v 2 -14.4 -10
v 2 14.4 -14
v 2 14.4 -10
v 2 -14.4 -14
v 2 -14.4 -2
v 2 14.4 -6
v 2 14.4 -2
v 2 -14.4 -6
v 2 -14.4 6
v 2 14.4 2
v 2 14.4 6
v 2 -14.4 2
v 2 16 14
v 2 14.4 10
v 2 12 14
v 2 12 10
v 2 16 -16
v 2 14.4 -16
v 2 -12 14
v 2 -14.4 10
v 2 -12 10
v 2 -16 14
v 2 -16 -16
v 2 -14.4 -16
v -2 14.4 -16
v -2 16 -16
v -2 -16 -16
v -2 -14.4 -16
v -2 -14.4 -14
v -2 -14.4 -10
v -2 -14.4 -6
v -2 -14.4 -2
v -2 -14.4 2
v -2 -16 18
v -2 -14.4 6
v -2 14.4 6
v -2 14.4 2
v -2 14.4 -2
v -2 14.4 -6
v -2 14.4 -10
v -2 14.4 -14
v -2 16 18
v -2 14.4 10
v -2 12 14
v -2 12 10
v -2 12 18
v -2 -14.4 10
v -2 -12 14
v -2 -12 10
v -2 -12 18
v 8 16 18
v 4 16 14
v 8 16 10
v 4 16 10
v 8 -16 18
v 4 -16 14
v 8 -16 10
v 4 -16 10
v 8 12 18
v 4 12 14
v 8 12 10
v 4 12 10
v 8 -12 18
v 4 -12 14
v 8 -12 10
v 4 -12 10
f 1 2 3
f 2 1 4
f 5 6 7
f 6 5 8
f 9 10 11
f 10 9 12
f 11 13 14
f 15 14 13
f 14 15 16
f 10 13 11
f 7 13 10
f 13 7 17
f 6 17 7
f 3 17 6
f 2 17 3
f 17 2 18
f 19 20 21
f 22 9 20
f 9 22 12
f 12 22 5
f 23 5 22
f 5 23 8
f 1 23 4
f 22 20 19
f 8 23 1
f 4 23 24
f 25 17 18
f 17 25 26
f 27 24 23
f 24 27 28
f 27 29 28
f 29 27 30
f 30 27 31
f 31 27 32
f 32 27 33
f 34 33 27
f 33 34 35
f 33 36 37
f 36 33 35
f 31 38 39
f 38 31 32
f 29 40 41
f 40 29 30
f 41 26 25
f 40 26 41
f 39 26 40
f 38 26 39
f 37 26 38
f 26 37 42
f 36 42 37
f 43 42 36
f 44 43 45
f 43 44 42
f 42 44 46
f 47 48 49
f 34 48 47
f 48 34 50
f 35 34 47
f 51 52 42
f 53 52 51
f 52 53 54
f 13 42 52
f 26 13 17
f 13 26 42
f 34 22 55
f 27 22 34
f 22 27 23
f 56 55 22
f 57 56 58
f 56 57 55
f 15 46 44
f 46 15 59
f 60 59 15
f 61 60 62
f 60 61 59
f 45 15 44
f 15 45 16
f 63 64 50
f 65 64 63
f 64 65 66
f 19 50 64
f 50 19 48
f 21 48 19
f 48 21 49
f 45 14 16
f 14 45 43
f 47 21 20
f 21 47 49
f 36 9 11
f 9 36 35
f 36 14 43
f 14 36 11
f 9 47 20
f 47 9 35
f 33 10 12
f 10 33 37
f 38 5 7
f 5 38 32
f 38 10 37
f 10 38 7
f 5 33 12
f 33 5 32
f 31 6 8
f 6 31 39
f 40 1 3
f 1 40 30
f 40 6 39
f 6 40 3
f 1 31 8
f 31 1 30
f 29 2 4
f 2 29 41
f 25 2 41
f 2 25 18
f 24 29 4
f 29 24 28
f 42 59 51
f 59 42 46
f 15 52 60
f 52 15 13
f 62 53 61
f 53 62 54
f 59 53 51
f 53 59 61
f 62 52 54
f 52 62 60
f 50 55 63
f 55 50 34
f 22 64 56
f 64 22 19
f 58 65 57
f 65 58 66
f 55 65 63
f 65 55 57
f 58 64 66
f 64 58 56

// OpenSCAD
size=32; //block=32 //item=8

difference(){
cube([size*0.125,size,size],center=true);
translate([0,0,size*0.40]){
cube([size*1.25,size*0.75,size*0.225],center=true);
};	//translate
translate([0,0,size*0.25]){
cube([size*1.25,size*0.9,size*0.125],center=true);
};	//translate
translate([0,0,0]){
cube([size*1.25,size*0.9,size*0.125],center=true);
};	//translate
translate([0,0,-size*0.25]){
cube([size*1.25,size*0.9,size*0.125],center=true);
};	//translate
translate([0,0,-size*0.50]){
cube([size*1.25,size*0.9,size*0.125],center=true);
};	//translate
};	//difference


module hook ()  {
cube([size*0.25,size*0.125,size*0.125],center=true);
translate([( (size*0.125)),0,-( (size*0.125)* 0.5)]){
rotate([0,90,0]){
cube([size*0.25,size*0.125,size*0.125],center=true);
};	//rotate
};	//translate
};	//hook

//hooks
translate([( (size*0.125) *0.5 ),size*0.5-( (size*0.125) * 0.5),size*0.5]){
hook();
};	//translate
translate([( (size*0.125) *0.5 ),-size*0.5+( (size*0.125) * 0.5),size*0.5]){
hook();
};	//translate
